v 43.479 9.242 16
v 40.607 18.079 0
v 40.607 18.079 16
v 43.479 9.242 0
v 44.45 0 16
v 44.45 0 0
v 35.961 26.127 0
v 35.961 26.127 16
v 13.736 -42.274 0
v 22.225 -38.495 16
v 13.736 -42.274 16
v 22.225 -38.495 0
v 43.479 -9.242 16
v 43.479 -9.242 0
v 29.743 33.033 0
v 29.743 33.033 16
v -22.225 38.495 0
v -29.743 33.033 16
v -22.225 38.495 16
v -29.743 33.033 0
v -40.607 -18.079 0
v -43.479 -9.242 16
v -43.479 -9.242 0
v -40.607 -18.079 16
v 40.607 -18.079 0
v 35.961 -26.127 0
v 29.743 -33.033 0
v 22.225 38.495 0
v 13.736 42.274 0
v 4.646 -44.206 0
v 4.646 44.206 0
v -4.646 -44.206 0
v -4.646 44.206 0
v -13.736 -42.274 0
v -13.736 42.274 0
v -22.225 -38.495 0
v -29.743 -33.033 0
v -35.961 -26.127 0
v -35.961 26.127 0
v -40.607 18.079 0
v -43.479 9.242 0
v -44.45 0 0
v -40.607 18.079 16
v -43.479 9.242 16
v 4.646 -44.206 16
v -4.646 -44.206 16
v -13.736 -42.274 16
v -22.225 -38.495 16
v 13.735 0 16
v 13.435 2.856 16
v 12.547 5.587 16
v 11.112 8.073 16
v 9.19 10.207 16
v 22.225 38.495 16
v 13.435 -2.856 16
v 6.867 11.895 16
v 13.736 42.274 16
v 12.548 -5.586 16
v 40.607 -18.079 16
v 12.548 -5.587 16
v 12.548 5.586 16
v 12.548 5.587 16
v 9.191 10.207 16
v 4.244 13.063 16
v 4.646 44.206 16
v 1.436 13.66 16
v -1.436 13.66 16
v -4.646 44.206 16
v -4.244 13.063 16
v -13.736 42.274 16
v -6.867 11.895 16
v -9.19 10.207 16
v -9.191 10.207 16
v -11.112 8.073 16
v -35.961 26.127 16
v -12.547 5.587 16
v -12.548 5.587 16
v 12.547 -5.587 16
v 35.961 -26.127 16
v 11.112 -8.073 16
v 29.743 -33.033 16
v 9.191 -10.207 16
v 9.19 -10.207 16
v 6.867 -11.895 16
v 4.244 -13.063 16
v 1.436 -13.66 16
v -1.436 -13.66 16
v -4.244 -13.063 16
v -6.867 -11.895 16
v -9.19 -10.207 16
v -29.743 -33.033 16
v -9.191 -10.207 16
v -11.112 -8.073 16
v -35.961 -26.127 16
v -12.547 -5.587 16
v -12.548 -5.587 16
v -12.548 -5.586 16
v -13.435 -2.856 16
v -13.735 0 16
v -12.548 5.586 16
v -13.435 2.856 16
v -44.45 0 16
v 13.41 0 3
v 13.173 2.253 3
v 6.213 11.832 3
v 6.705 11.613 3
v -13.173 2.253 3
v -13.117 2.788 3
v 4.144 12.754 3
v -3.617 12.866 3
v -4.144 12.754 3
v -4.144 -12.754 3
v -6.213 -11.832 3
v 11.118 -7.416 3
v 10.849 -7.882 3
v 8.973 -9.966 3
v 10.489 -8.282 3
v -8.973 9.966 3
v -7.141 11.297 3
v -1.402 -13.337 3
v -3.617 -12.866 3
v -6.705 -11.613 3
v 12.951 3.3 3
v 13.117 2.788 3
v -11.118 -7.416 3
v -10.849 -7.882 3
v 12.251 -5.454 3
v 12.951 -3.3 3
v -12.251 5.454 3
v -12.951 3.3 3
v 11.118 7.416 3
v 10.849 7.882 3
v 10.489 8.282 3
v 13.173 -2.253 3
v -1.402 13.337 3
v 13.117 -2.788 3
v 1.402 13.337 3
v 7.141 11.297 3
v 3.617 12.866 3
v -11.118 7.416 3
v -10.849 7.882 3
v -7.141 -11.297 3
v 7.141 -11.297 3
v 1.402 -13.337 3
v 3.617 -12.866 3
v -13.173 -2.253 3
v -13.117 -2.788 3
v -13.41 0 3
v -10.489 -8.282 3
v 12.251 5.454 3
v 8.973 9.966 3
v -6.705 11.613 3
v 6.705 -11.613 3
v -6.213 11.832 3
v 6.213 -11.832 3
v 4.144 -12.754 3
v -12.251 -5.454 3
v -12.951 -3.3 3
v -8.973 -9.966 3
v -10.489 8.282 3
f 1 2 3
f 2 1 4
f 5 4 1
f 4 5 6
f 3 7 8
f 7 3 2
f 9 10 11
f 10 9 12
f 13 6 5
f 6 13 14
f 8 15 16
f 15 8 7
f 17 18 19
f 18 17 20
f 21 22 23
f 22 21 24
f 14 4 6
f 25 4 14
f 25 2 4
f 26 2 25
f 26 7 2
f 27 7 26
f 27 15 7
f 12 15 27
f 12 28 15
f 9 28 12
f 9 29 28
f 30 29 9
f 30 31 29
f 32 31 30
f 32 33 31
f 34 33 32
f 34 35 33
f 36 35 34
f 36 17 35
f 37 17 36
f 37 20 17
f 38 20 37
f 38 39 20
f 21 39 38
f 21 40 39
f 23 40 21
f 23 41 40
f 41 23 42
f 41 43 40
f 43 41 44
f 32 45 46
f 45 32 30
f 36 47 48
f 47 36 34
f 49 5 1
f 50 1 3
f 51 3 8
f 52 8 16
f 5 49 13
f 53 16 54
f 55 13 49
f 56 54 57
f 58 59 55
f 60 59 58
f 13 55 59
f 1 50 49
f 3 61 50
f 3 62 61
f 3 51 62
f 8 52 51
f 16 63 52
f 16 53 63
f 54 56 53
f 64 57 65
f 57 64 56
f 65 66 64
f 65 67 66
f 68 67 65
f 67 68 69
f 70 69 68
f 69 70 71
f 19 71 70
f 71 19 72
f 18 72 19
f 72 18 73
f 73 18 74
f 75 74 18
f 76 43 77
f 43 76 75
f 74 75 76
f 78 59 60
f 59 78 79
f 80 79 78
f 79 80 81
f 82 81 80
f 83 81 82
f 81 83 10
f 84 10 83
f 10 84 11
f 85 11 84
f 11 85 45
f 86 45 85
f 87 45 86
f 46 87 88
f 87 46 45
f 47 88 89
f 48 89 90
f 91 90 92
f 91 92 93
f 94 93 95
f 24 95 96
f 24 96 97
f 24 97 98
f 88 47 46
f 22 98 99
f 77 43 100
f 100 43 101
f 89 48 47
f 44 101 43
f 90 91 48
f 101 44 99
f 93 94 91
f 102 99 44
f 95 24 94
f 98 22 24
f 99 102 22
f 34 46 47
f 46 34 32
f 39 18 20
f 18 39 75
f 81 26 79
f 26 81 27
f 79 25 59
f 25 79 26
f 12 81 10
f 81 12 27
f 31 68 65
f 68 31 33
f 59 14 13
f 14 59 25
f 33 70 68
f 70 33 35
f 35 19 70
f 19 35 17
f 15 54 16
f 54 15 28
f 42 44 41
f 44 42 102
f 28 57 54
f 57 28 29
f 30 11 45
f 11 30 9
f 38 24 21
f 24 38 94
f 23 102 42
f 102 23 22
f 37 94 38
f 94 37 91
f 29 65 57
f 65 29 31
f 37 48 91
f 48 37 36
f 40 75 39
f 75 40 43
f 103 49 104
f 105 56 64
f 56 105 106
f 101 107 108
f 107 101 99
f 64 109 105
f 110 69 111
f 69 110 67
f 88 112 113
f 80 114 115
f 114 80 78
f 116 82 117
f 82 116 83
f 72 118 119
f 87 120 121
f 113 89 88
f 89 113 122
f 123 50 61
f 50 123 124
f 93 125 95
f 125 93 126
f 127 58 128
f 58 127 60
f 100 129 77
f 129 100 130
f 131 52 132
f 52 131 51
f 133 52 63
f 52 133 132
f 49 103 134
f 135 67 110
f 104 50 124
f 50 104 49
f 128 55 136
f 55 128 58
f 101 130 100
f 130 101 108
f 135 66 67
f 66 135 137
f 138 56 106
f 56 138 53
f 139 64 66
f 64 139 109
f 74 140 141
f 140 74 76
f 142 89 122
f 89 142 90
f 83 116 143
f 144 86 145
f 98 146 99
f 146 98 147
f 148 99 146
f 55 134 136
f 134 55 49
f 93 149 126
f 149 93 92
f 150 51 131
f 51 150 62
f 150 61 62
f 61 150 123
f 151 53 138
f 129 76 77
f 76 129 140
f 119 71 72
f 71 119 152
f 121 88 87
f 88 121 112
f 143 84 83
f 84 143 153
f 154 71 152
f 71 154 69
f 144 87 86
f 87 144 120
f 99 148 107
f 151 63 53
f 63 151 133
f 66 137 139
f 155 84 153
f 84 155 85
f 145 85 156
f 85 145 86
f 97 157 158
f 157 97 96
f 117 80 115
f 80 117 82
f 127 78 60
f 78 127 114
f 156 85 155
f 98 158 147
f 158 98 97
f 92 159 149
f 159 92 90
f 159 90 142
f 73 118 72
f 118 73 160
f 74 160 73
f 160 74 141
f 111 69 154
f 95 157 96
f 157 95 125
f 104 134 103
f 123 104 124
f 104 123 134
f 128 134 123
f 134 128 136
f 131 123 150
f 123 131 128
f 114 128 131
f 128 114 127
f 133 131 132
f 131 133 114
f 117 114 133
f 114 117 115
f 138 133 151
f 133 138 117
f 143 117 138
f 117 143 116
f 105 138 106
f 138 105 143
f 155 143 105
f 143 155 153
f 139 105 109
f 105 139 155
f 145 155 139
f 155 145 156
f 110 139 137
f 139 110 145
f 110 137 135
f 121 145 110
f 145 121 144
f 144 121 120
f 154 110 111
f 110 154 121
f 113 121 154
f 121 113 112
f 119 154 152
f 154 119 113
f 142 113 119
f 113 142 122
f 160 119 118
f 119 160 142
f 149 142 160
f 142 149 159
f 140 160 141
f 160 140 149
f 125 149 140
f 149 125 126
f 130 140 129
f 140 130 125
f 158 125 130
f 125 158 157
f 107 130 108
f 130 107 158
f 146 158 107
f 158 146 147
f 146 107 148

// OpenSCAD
base_radius = 44.45;

pipe_radius = 13.335;
zero = 0.001;


difference()
{
    
     cylinder(16, base_radius, base_radius);
    cylinder(16+zero, pipe_radius, pipe_radius+.4);

   
}
cylinder(3, pipe_radius+1, pipe_radius+1);
